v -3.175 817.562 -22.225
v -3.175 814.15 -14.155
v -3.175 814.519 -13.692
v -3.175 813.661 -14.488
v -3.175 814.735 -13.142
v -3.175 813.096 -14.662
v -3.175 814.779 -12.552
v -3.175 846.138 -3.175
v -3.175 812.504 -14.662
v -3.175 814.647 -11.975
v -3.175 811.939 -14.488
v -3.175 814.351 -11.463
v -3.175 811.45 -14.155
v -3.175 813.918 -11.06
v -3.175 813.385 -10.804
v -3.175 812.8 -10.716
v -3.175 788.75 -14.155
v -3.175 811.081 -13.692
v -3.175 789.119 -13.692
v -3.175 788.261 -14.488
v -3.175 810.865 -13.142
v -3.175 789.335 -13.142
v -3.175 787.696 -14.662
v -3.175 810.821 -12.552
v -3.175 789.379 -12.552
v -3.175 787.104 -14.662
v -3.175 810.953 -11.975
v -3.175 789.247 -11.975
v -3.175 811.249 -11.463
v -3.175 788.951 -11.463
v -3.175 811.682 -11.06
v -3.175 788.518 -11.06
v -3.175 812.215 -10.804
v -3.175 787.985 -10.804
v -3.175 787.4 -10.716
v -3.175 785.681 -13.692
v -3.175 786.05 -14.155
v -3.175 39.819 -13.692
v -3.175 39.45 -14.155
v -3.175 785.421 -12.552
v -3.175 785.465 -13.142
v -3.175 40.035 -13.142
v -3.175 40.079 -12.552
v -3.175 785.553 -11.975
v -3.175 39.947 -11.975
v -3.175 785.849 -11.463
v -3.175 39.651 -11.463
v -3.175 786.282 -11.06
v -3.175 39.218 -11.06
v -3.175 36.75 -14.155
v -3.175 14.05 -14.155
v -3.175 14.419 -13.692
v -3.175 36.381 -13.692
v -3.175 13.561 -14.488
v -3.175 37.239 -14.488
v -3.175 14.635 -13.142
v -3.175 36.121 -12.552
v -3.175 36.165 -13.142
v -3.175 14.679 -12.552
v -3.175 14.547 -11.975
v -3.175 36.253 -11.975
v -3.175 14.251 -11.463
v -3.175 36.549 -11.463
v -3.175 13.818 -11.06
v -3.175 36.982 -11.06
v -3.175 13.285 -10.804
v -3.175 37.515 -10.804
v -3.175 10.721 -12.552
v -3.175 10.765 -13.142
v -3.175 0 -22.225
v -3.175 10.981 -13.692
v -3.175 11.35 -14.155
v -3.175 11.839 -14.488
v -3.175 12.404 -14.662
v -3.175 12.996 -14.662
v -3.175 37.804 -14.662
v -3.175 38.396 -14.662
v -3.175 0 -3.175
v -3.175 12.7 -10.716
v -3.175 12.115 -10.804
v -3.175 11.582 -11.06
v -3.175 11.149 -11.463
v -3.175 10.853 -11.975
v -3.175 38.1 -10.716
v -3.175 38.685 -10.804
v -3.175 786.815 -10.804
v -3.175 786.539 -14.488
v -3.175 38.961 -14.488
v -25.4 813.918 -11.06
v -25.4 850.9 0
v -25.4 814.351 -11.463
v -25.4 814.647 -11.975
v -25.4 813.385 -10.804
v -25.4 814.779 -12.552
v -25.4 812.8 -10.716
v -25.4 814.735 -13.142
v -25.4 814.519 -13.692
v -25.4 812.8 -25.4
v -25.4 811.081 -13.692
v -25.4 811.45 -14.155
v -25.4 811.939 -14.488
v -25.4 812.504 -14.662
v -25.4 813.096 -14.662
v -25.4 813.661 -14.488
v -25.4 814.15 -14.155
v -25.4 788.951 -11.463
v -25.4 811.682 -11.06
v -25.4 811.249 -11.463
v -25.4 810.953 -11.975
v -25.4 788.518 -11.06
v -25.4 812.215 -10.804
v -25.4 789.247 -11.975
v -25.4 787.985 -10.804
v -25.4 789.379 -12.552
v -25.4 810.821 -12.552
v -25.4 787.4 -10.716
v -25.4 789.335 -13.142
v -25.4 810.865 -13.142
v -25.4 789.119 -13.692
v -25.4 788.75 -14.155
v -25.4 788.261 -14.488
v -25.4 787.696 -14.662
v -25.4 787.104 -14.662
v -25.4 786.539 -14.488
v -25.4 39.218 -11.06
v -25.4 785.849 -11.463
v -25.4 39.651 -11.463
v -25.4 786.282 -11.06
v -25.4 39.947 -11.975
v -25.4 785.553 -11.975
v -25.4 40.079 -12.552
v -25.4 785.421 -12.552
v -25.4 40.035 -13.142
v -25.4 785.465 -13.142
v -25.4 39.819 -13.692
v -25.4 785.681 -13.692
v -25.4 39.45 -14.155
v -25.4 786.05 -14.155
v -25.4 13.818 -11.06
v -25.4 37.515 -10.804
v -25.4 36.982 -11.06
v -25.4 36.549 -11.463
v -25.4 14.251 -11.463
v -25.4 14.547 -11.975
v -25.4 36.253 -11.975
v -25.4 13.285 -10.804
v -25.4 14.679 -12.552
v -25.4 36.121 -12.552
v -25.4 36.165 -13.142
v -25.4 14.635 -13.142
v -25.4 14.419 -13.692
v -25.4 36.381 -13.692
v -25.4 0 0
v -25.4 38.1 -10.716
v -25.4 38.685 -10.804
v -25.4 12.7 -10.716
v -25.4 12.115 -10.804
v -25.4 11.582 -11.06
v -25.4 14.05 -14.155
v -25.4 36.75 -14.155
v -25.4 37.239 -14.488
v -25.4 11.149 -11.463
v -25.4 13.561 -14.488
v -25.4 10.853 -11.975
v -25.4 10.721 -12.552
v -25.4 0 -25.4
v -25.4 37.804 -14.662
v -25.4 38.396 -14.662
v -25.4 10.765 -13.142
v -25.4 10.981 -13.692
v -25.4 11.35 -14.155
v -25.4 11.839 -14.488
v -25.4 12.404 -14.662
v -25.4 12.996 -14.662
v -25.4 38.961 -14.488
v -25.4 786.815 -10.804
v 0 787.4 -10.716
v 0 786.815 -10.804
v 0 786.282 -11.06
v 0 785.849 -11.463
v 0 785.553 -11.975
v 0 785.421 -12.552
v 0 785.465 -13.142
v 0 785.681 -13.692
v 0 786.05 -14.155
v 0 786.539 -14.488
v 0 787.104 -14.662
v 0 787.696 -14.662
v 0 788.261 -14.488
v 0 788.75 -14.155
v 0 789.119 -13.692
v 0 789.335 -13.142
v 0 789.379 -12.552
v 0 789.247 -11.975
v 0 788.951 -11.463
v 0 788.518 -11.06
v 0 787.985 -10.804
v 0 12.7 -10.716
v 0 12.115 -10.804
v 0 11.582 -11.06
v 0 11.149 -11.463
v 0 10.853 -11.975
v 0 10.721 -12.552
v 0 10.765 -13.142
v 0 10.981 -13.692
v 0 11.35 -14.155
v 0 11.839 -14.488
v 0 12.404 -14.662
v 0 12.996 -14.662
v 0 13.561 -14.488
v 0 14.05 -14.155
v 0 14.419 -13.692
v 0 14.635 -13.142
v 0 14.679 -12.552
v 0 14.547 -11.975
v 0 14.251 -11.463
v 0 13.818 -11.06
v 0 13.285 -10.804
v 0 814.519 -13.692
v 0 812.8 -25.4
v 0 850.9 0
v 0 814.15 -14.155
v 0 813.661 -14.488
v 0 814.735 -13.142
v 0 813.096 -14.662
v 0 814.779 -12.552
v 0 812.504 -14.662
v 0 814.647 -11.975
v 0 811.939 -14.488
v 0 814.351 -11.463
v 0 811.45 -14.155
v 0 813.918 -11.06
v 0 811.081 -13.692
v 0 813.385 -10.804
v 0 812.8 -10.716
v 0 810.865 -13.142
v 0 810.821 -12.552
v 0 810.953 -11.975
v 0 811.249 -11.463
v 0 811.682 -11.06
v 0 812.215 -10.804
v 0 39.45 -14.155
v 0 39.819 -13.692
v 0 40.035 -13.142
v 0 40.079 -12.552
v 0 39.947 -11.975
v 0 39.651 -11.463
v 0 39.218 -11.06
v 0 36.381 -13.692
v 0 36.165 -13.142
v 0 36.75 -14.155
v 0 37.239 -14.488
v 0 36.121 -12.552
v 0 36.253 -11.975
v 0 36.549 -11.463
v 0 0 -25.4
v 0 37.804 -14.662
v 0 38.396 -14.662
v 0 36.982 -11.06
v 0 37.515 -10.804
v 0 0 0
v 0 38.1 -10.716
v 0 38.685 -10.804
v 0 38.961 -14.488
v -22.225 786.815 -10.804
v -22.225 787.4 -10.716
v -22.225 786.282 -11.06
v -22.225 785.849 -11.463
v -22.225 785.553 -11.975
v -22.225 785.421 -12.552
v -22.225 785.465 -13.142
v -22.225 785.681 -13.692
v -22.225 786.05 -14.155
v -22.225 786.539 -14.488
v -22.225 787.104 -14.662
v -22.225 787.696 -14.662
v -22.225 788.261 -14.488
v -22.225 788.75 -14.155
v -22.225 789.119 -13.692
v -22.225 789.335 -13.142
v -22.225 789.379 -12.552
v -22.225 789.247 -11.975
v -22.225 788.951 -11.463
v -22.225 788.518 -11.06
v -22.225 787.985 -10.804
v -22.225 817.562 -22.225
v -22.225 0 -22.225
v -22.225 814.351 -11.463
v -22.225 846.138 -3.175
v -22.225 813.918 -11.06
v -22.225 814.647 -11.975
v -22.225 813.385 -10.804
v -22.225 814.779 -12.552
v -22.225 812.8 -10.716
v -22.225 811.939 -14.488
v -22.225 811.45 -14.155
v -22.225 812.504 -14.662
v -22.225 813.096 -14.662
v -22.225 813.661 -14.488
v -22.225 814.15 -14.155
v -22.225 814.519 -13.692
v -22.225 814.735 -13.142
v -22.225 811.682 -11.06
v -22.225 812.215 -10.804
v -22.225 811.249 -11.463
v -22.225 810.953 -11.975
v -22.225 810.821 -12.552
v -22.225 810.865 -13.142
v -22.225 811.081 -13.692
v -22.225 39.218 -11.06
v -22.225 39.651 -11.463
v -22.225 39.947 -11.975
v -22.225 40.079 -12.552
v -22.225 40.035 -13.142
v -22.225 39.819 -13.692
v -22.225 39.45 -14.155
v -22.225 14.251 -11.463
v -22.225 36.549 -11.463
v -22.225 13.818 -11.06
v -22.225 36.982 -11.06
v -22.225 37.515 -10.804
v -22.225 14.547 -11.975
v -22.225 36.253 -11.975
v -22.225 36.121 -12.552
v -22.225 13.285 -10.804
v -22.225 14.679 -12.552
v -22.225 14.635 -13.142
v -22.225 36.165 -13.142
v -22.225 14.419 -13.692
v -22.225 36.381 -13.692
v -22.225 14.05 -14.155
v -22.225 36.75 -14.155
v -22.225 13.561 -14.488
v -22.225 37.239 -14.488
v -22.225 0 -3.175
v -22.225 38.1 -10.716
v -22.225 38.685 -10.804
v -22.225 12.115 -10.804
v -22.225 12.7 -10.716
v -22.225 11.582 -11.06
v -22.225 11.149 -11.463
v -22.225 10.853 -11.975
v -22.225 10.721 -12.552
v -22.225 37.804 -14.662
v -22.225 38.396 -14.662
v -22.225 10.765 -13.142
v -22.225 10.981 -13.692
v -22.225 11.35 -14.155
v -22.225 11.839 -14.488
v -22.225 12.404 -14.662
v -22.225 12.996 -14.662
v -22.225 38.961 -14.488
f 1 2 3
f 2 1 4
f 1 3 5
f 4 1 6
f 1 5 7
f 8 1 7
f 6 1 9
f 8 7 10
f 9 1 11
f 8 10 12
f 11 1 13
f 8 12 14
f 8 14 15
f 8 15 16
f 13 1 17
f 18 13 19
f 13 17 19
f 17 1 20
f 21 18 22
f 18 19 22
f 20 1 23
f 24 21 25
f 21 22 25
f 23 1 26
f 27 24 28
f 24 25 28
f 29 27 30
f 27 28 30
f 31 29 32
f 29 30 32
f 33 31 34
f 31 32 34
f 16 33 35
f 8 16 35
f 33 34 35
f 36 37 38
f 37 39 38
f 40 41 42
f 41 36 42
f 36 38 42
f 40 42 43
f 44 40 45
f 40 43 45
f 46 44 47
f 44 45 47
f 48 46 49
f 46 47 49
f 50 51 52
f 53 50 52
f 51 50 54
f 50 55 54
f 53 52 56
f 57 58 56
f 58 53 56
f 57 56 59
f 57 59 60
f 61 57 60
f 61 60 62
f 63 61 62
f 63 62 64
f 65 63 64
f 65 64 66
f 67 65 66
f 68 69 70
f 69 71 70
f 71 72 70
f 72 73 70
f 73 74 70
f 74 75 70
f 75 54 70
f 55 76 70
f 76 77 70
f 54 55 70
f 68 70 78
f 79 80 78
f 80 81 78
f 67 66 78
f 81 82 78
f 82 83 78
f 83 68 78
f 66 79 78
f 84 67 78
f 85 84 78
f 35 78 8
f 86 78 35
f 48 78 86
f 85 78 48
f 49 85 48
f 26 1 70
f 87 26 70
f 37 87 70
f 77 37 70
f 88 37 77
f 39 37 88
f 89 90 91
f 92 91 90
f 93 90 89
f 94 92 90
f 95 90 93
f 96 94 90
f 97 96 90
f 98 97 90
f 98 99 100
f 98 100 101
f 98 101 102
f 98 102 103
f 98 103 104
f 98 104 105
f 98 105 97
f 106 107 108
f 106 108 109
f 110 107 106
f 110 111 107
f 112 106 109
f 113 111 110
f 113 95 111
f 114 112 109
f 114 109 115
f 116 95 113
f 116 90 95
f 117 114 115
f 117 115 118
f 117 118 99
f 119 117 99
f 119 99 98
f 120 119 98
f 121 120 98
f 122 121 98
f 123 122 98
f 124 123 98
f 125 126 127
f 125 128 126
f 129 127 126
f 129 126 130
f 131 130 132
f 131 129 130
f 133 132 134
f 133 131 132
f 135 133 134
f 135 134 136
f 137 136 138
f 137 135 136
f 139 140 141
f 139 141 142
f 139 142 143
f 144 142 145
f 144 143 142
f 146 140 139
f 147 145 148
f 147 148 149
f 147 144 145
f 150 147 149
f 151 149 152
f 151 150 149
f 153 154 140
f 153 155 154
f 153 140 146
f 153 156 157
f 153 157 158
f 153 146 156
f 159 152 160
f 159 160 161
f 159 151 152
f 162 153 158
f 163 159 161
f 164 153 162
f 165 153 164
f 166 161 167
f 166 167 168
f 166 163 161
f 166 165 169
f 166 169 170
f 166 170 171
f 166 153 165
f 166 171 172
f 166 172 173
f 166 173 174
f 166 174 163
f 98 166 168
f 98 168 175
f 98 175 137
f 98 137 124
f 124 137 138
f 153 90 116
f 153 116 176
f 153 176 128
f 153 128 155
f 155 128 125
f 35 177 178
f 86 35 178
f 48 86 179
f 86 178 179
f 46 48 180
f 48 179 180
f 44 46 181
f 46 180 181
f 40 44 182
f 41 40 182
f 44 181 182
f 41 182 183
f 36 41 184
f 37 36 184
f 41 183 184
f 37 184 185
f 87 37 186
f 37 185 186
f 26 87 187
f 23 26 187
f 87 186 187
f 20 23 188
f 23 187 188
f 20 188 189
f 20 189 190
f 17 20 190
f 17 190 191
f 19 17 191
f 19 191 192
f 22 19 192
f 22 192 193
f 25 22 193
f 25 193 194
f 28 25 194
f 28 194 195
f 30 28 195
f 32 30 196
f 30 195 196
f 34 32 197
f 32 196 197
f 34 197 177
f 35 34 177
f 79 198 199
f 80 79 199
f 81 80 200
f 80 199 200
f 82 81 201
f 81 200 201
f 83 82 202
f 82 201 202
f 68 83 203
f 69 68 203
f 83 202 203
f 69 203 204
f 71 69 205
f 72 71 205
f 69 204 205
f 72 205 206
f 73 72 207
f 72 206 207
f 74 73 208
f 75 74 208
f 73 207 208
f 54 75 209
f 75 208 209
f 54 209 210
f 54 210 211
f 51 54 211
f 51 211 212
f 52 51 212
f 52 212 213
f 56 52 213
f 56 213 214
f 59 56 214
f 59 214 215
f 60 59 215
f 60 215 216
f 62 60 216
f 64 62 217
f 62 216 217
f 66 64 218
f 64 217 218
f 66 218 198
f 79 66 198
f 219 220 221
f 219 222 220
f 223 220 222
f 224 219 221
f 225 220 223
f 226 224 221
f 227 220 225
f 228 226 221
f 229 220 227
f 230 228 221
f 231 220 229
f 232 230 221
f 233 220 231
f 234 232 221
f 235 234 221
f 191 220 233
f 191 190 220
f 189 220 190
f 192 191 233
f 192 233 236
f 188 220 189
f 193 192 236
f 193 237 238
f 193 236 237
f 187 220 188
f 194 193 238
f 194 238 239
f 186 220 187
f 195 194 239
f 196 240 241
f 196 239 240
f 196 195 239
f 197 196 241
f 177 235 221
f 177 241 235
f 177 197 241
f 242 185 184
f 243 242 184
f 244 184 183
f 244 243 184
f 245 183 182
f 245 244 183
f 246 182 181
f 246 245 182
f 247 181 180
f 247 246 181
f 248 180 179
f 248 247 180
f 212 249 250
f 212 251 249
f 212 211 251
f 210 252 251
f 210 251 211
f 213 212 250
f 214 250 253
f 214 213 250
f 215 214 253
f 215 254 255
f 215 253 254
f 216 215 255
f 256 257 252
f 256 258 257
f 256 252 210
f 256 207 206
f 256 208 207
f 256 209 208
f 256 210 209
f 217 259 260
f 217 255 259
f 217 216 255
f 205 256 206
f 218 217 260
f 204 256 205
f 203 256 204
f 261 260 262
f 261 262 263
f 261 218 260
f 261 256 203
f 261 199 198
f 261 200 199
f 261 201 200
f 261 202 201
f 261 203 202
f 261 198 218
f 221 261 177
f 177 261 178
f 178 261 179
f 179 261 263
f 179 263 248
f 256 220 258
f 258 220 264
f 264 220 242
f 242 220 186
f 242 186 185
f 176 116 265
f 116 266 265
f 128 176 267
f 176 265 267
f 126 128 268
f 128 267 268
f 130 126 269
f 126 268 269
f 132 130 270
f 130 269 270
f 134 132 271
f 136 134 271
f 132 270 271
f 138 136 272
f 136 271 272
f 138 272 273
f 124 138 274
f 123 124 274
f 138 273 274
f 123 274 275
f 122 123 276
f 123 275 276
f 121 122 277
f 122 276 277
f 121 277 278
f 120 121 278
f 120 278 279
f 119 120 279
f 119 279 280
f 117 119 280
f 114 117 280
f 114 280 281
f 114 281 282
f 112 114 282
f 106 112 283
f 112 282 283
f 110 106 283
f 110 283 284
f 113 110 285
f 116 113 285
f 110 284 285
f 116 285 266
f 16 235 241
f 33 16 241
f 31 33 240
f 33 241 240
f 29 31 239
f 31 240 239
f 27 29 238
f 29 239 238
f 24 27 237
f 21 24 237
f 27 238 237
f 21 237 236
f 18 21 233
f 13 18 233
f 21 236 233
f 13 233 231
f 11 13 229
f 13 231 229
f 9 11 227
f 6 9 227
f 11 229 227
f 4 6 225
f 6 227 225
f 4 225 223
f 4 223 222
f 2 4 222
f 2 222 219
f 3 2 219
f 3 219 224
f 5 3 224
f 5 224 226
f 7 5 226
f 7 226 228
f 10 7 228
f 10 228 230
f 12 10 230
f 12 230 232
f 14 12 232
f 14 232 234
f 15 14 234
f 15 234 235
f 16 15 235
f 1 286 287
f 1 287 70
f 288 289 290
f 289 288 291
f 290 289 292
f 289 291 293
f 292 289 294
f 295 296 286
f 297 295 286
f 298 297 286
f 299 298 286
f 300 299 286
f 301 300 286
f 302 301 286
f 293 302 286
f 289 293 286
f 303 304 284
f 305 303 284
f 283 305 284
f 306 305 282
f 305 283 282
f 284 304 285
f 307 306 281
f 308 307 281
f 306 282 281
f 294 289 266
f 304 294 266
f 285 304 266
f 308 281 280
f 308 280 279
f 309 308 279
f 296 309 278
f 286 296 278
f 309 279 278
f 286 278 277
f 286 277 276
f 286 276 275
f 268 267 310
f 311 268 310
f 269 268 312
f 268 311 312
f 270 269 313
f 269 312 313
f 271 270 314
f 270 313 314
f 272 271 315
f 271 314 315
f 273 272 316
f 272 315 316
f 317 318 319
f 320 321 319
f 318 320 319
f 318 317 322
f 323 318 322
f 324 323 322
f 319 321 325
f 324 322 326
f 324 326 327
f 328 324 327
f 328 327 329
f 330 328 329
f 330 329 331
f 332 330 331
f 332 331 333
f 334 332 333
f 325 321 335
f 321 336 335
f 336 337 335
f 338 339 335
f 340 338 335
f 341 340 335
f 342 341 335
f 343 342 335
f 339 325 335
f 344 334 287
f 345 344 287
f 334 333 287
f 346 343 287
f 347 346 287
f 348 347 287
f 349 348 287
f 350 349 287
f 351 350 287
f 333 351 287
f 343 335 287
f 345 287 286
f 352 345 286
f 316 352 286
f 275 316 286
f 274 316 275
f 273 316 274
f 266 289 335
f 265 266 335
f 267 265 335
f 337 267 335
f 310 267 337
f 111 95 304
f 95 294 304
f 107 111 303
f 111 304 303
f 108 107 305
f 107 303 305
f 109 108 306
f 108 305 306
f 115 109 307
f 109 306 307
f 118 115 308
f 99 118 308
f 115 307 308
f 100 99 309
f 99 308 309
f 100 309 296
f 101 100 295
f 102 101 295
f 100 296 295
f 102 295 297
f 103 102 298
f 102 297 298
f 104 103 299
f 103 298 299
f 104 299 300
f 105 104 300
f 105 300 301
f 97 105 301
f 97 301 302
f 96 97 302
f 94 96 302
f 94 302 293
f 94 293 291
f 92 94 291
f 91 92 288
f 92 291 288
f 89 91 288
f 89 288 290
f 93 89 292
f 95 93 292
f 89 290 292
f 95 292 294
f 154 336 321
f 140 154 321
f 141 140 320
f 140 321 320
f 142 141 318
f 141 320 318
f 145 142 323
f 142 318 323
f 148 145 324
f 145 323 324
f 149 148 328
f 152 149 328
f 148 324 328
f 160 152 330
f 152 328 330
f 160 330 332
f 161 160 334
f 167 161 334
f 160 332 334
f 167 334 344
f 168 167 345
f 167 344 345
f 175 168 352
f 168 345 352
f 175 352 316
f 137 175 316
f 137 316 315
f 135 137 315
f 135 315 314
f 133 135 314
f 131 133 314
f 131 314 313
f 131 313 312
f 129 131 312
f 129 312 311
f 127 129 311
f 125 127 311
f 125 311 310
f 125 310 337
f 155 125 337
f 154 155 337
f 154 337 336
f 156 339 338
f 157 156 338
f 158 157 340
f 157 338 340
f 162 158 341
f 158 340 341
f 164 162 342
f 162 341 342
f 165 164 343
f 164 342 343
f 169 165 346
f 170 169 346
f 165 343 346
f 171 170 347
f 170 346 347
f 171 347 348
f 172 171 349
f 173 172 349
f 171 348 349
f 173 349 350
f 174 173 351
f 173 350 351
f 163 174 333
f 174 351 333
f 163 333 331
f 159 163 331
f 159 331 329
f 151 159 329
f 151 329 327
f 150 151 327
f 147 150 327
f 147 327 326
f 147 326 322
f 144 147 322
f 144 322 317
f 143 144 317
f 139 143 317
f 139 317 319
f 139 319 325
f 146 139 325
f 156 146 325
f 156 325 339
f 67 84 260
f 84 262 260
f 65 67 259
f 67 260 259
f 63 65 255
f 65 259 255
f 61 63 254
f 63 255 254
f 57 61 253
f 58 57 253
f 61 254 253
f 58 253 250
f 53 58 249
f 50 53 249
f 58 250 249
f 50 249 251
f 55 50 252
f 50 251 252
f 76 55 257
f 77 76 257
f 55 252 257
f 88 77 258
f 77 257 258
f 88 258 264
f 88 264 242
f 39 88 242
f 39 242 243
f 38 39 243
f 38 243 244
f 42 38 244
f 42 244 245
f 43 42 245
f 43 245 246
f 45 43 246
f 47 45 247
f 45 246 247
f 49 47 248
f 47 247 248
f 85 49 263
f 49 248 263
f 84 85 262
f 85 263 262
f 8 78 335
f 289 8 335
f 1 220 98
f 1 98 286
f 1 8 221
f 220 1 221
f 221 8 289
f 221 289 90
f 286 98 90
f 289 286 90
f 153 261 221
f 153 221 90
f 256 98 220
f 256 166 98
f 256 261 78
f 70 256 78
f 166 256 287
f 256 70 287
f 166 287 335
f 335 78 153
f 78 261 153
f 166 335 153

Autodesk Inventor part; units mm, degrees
ref_plane "YZ Plane" through (0, 0, 0) normal (1, 0, 0) x (0, 1, 0)
ref_plane "XZ Plane" through (0, 0, 0) normal (0, 1, 0) x (-1, 0, 0)
ref_plane "XY Plane" through (0, 0, 0) normal (0, 0, 1) x (1, 0, 0)
sketch "Sketch1" plane through (0, 0, 0) normal (0, 1, 0) x (-1, 0, 0)
  line L0 (0, 0) -> (25.4, 0)
  line L1 (25.4, 0) -> (25.4, -25.4)
  line L2 (25.4, -25.4) -> (0, -25.4)
  line L3 (0, -25.4) -> (0, 0)
  line L4 (3.175, -3.175) -> (22.225, -3.175)
  line L5 (22.225, -3.175) -> (22.225, -22.225)
  line L6 (22.225, -22.225) -> (3.175, -22.225)
  line L7 (3.175, -22.225) -> (3.175, -3.175)
  dimension "d0" = 25.4
  dimension "d1" = 25.4
  dimension "d2" = 19.05
  dimension "d3" = 19.05
  dimension "d4" = 3.175
  dimension "d5" = 3.175
extrude "Extrusion1" add sketch "Sketch1" along normal blind 850.9
sketch "Sketch2" plane through (-25.4, 0, -25.4) normal (-1, 0, 0) x (0, 0, 1)
  line L0 (25.4, 0) -> (0, 0) projected
  line L1 (25.4, 0) -> (25.4, 850.9) projected
  line L2 (0, 850.9) -> (25.4, 850.9) projected
  line L3 (0, 0) -> (0, 850.9) projected
  point P0 (12.7, 812.8)
  point P1 (12.7, 787.4)
  point P2 (12.7, 12.7)
  point P3 (12.7, 38.1)
  dimension "d8" = 12.7
  dimension "d9" = 38.1
  dimension "d12" = 12.7
  dimension "d13" = 12.7
  dimension "d14" = 12.7
  dimension "d15" = 12.7
  dimension "d23" = 812.8
  dimension "d24" = 787.4
hole "Hole1" at (-25.4, 812.8, -12.7) at (-25.4, 787.4, -12.7) at (-25.4, 12.7, -12.7) at (-25.4, 38.1, -12.7) direction (1, 0, 0) diameter 3.9688 end through all
sketch "Sketch3" plane through (-25.4, 0, -25.4) normal (-1, 0, 0) x (0, 0, 1)
  circle A0 centre (12.7, 12.7) radius 1.9844 projected
  circle A1 centre (12.7, 812.8) radius 1.9844 projected
  circle A2 centre (12.7, 787.4) radius 1.9844 projected
  circle A3 centre (12.7, 38.1) radius 1.9844 projected
  line L0 (25.4, 0) -> (0, 0) projected
  line L1 (25.4, 0) -> (25.4, 850.9) projected
  line L2 (0, 850.9) -> (25.4, 850.9) projected
  line L3 (0, 0) -> (0, 850.9) projected
  line L4 (25.4, 850.9) -> (0, 850.9)
  line L5 (0, 850.9) -> (0, 812.8)
  line L6 (0, 0) -> (0, 850.9) projected
  line L7 (0, 812.8) -> (25.4, 850.9)
  dimension "d25" = 38.1
extrude "Extrusion2" cut sketch "Sketch3" against normal blind 25.4 contours L7 L3 L2
properties part number "1x1 support"
